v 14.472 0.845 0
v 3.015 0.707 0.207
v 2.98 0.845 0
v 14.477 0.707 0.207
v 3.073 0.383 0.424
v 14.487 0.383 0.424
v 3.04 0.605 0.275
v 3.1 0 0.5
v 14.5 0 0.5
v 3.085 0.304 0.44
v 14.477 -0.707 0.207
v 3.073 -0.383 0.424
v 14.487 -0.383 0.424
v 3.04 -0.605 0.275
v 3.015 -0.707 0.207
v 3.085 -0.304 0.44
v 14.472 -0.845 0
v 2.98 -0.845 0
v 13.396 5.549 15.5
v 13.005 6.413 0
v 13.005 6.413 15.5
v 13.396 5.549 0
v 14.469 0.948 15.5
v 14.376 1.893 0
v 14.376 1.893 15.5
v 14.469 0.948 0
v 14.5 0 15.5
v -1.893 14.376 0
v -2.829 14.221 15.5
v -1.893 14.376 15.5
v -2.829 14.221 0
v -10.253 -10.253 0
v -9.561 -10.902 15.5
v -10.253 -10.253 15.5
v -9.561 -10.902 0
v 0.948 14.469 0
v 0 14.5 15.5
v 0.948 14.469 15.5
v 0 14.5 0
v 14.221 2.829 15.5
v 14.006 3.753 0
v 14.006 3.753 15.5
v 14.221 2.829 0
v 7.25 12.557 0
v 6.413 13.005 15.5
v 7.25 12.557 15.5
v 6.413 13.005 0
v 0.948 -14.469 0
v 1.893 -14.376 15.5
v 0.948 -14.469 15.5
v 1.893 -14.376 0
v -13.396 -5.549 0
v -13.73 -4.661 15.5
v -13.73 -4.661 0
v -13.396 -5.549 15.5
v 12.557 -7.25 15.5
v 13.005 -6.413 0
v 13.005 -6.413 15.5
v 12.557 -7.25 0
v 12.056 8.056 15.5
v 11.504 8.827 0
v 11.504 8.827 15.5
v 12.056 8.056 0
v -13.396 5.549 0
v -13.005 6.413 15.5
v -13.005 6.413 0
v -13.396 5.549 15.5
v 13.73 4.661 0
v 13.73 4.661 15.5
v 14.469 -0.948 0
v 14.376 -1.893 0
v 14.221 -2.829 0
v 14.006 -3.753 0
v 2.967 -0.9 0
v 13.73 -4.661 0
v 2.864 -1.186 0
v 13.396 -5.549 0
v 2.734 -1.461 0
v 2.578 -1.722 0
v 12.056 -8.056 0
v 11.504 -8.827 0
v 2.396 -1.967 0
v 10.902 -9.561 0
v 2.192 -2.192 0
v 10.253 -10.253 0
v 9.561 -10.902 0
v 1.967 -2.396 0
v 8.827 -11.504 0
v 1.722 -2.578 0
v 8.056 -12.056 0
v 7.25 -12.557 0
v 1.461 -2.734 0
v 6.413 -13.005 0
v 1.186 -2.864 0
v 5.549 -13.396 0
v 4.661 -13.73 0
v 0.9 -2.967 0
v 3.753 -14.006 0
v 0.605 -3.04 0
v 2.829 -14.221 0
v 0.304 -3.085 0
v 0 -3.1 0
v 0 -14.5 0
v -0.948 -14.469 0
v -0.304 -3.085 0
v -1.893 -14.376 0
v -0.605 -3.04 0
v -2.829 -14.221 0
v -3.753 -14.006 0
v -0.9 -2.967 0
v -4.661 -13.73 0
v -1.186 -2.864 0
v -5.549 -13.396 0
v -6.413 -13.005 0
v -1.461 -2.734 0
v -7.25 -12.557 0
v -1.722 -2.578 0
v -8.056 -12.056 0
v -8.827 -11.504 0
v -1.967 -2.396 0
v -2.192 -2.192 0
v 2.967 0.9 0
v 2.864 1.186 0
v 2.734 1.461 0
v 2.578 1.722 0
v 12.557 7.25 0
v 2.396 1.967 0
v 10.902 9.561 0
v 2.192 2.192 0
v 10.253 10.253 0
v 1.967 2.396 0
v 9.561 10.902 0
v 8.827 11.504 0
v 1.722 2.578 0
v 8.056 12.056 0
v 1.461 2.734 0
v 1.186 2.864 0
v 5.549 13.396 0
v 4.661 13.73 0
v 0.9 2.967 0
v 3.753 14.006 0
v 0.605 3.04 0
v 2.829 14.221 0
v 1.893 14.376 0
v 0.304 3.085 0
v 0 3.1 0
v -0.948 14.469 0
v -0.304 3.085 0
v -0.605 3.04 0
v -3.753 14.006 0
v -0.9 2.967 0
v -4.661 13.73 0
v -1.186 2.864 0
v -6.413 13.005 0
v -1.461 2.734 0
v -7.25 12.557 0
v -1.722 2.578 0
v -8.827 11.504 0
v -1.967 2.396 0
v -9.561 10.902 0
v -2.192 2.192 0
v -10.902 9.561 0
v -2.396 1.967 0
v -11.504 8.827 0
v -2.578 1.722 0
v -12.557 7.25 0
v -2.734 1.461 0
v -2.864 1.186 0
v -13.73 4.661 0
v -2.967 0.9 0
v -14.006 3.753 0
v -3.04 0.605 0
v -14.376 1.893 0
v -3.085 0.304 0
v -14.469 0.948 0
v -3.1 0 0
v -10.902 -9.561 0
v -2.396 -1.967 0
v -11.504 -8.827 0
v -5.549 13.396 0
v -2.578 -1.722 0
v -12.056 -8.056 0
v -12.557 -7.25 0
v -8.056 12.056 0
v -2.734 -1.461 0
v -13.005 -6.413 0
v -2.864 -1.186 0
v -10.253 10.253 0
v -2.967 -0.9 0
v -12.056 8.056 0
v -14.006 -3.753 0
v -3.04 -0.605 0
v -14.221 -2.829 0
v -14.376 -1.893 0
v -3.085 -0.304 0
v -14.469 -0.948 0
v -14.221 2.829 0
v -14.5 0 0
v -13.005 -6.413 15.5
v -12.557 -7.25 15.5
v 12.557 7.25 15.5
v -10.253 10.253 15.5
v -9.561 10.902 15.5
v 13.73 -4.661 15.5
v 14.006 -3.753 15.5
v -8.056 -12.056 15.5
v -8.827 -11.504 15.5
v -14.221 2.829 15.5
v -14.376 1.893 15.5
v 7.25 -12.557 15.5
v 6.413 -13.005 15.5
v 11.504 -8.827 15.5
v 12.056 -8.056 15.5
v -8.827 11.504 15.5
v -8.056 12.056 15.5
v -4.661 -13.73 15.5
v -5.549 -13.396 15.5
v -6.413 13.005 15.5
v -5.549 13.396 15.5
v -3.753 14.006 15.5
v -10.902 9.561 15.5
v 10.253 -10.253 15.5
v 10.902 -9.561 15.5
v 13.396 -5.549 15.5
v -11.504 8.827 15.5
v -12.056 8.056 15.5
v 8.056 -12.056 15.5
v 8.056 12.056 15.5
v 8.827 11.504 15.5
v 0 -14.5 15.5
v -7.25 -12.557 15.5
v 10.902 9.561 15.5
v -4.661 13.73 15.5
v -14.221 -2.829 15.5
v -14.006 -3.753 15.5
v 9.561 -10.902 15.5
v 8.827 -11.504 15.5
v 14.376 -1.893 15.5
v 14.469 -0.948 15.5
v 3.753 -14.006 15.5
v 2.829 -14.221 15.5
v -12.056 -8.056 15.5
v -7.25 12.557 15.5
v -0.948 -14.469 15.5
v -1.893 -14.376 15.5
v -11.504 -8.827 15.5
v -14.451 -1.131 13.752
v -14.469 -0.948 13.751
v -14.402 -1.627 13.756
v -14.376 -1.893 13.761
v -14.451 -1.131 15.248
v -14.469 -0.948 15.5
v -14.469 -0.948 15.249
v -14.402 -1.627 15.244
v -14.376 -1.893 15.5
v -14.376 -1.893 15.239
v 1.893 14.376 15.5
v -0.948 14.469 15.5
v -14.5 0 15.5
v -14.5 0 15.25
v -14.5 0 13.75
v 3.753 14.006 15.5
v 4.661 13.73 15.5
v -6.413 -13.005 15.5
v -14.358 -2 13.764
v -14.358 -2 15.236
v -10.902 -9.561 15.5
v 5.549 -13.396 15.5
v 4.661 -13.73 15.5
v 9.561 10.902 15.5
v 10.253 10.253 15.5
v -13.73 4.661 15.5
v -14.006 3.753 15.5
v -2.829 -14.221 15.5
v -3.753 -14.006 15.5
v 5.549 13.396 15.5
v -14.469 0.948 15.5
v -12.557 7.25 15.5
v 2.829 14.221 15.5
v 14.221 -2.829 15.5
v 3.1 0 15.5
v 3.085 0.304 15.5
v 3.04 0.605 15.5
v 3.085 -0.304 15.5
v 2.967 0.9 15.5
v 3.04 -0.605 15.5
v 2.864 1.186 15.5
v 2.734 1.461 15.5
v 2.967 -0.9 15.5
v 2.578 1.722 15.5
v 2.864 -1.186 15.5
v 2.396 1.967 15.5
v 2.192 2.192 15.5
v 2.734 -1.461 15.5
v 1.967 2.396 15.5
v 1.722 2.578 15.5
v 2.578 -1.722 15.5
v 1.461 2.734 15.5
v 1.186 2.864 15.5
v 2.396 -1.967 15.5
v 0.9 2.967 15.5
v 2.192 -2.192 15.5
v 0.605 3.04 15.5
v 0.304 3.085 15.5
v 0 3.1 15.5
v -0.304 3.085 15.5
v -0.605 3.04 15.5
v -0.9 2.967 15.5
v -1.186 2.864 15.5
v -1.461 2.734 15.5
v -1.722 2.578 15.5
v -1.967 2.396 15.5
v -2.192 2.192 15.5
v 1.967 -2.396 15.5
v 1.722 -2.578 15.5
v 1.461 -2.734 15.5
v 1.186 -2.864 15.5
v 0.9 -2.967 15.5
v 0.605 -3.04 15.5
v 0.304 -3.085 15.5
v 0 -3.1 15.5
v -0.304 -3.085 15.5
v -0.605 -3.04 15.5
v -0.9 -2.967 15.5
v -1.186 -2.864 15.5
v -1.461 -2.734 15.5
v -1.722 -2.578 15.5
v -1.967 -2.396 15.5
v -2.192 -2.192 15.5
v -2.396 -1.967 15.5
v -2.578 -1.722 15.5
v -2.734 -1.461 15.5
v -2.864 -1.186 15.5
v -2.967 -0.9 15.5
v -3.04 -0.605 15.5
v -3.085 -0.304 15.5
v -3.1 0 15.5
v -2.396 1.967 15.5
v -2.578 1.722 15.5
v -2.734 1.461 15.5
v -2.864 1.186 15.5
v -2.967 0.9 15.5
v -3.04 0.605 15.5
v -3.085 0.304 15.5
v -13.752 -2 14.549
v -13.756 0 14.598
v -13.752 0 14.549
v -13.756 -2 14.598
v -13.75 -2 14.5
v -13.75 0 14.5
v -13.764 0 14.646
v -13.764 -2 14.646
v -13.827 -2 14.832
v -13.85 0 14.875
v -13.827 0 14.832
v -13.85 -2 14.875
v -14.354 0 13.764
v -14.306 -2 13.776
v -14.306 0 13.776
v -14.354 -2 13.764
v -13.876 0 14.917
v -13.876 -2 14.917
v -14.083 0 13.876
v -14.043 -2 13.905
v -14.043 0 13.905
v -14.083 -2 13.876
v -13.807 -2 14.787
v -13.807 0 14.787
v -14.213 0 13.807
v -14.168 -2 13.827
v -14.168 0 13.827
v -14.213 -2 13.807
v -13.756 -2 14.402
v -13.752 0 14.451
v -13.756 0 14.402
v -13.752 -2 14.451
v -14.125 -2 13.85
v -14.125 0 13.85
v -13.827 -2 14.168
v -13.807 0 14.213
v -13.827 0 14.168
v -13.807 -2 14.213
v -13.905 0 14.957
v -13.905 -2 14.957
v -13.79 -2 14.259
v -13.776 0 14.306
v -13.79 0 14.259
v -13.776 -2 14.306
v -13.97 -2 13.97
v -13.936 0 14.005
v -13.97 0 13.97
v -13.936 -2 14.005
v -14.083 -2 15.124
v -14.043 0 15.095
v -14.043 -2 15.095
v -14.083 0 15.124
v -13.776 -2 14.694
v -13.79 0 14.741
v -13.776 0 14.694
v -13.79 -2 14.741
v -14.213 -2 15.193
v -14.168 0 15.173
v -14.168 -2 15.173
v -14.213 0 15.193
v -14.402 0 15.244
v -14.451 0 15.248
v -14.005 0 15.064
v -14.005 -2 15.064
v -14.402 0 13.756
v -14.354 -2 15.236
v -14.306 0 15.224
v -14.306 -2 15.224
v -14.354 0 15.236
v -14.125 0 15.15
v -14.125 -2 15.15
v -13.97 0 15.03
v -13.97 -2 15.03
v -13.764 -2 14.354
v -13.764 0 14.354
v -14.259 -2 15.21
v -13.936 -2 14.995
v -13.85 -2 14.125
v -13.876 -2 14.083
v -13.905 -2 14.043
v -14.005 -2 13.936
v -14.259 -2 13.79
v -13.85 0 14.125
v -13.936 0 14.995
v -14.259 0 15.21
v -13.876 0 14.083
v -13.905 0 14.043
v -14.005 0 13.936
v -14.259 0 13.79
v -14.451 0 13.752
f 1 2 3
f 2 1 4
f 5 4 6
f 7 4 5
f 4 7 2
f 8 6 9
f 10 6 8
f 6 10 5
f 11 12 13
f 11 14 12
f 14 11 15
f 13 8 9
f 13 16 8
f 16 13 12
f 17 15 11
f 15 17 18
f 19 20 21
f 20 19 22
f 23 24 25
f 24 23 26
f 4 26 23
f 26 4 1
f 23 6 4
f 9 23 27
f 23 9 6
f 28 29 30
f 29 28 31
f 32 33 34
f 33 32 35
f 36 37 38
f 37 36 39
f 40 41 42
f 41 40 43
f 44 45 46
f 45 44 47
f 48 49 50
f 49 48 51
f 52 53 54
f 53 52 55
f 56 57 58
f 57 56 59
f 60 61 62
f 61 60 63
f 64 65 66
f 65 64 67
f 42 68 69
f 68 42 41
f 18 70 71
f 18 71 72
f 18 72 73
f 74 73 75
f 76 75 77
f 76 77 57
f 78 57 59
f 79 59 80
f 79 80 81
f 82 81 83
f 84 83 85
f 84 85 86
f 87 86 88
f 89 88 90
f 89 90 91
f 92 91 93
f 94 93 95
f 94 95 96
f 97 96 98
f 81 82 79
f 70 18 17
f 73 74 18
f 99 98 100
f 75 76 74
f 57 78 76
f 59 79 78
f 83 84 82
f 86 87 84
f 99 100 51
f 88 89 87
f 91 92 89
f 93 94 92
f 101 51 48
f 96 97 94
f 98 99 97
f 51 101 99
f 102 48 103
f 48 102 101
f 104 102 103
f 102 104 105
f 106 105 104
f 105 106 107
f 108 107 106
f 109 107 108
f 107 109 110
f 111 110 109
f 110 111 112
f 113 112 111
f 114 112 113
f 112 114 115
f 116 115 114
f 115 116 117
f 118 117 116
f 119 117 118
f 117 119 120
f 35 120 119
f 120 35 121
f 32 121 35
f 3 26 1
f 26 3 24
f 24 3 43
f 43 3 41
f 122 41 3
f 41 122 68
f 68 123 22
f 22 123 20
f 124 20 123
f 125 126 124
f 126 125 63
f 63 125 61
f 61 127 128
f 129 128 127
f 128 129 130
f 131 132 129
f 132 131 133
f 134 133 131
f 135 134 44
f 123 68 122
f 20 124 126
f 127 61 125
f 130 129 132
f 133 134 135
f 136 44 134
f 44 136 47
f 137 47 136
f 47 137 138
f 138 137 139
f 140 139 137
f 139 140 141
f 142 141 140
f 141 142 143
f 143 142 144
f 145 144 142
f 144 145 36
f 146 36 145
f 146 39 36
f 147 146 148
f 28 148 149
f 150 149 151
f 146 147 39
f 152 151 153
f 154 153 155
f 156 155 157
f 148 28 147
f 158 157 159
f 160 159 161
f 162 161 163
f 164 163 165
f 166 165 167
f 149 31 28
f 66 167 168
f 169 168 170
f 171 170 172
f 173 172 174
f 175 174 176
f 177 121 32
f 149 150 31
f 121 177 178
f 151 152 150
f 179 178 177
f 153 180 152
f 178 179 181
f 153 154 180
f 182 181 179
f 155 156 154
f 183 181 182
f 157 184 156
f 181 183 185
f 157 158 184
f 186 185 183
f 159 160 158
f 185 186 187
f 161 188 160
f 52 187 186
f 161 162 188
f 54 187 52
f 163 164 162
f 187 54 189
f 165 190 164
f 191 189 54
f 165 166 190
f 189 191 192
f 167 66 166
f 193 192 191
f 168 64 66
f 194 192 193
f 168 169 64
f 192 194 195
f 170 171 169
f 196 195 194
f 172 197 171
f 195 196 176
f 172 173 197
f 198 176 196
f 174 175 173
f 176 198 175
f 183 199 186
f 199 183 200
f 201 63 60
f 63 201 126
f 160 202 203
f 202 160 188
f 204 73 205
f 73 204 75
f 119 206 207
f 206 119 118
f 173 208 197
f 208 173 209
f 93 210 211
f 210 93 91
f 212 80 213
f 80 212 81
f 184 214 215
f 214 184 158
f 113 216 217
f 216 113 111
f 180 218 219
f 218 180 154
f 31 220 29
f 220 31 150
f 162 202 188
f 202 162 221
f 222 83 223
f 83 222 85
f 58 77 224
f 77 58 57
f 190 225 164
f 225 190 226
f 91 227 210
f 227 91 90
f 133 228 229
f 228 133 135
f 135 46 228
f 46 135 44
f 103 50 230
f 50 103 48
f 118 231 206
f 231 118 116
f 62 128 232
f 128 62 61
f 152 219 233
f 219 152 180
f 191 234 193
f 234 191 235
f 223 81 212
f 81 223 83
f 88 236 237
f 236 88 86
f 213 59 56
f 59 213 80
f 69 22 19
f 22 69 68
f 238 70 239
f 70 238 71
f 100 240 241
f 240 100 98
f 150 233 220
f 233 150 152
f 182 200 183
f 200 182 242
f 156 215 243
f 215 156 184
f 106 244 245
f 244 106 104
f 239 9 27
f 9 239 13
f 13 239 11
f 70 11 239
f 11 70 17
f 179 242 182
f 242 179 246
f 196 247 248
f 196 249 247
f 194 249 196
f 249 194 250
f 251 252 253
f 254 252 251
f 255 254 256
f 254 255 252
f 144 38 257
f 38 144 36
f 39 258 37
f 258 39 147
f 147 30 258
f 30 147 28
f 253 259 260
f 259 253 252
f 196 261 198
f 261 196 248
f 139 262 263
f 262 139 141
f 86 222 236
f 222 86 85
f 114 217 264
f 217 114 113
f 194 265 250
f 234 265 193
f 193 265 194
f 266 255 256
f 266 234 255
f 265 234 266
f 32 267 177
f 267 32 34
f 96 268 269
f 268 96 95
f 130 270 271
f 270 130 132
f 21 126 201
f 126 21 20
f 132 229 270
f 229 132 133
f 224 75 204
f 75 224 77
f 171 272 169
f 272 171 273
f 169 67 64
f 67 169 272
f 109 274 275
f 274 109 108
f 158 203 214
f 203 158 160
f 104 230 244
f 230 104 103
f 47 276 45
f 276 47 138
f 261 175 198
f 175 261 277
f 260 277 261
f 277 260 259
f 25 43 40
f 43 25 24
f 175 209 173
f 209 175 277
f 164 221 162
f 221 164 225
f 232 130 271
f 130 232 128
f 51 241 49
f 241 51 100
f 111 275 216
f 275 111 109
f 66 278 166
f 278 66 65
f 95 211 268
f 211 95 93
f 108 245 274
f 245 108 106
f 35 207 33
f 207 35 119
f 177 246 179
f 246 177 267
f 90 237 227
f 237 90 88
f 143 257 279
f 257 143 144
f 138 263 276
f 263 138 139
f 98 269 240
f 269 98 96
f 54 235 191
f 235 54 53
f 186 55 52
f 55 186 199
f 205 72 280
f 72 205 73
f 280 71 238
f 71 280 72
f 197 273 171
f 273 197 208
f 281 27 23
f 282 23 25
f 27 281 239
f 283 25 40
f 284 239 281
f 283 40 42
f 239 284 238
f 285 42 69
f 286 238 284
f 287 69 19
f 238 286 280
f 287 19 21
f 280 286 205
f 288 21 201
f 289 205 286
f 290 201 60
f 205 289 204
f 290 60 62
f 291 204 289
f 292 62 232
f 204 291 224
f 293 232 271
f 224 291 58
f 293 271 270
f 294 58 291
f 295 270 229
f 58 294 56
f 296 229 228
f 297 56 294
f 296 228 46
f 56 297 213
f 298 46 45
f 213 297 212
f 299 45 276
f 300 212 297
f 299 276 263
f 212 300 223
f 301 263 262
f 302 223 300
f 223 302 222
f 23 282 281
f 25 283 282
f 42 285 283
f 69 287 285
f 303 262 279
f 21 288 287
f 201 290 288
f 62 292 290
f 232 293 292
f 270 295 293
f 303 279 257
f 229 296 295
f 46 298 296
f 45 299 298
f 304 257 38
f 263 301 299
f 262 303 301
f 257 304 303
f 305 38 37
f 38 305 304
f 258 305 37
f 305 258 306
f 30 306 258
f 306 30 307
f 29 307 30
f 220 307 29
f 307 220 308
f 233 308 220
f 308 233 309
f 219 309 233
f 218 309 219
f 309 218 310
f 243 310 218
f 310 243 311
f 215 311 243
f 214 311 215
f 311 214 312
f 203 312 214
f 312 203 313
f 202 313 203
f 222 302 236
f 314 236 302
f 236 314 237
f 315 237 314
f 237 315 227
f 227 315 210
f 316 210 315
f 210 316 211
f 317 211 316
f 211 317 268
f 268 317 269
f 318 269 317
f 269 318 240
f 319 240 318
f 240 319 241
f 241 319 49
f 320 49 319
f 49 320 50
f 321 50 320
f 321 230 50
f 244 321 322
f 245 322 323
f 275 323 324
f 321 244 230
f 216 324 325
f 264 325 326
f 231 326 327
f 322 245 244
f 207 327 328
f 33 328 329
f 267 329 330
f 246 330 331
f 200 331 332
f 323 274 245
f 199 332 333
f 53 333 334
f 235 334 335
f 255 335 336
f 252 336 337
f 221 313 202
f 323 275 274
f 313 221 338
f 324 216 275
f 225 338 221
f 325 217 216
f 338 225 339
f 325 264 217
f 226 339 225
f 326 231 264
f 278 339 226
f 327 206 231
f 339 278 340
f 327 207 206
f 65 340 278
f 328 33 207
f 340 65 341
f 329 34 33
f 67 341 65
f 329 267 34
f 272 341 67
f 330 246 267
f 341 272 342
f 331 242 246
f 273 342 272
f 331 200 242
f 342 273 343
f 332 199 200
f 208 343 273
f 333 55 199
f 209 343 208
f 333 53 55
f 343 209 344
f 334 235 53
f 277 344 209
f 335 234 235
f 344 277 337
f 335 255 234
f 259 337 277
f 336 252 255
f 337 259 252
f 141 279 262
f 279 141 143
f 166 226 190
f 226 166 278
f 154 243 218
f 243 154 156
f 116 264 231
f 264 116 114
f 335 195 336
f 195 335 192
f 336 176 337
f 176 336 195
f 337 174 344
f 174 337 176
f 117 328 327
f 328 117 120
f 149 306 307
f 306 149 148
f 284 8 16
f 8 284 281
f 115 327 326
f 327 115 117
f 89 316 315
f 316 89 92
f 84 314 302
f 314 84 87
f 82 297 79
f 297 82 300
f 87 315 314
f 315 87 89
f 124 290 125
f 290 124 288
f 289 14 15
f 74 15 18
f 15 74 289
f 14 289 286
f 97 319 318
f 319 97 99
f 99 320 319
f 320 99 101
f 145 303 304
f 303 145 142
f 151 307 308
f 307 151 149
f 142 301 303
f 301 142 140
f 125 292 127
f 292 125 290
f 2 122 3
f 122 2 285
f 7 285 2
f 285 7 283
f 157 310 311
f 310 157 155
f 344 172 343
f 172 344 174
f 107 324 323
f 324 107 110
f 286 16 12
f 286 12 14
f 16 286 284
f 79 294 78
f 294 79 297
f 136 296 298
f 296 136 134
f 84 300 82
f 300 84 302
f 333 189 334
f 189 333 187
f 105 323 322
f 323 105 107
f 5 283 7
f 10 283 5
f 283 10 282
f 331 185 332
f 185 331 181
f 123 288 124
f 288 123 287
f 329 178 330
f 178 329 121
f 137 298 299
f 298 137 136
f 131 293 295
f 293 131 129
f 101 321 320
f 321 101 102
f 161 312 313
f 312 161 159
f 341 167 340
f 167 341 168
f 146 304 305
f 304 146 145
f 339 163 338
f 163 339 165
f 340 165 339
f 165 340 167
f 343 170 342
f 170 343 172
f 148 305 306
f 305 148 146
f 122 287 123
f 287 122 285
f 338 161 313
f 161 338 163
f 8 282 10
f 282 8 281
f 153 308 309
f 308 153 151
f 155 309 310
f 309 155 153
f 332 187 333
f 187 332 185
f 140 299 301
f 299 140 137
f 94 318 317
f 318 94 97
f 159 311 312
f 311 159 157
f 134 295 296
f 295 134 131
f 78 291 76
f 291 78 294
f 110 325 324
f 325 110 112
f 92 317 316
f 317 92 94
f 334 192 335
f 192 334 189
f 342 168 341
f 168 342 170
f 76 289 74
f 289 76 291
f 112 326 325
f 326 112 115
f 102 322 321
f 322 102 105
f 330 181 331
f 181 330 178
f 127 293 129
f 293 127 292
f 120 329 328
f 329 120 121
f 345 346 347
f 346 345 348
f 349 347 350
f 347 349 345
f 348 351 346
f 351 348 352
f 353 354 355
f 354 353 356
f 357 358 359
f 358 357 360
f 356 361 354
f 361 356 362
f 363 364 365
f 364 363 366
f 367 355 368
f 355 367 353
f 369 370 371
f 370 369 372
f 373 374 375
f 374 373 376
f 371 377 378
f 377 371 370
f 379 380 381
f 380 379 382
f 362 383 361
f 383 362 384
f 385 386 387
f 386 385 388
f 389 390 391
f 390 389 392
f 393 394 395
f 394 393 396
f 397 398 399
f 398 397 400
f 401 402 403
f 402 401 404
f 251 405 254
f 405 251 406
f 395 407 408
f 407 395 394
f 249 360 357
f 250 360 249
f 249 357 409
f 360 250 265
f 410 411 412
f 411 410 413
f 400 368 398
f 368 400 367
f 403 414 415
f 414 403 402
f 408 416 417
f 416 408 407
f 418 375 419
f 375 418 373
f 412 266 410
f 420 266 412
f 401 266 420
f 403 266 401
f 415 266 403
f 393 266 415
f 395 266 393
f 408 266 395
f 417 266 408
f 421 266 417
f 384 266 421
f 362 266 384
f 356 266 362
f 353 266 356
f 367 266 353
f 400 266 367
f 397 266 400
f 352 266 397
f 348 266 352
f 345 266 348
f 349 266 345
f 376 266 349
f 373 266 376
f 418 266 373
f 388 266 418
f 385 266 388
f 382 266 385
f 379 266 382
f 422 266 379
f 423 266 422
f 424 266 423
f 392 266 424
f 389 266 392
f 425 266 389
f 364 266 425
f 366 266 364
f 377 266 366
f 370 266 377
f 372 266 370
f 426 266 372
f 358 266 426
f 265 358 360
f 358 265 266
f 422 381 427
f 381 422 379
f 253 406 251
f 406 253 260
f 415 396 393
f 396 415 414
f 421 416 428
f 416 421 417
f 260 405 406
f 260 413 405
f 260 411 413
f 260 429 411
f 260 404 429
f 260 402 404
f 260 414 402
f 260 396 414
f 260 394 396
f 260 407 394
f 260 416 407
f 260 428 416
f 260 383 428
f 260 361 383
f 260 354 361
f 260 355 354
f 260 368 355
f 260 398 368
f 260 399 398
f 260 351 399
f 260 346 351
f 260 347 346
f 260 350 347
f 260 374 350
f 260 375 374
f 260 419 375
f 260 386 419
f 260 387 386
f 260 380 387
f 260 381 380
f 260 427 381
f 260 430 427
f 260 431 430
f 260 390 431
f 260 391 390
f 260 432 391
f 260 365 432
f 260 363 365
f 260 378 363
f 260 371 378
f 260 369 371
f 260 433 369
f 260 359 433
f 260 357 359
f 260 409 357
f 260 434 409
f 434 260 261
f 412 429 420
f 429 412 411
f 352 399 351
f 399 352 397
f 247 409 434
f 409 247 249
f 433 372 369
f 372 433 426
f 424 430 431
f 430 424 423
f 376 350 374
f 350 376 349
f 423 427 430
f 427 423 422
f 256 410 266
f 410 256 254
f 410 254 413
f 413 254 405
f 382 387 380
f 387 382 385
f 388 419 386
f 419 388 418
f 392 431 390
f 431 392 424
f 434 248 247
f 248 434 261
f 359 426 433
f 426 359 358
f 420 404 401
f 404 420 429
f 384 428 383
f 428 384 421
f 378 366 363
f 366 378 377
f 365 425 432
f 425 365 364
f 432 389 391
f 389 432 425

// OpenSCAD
// Replacement knob for hotplate stirrer (D-shaft 6 mm)
// Print orientation: bottom face (with D-bore) on the bed, z = 0

// ---------------- Parameters ----------------
knob_d        = 30;    // knob outer diameter
knob_h        = 15;    // knob height
shaft_d       = 6.2;   // D-bore diameter
shaft_flat    = 4.7;   // distance from D-flat to opposite side
groove_count  = 18;    // number of vertical grip grooves
groove_d      = 2;     // groove diameter (half-cylinder)
pointer_w     = 1.5;   // pointer groove width
pointer_d     = 1;     // pointer groove depth
eps           = 0.5;   // overcut for clean differences

$fn = 96;

// ---------------- Derived ----------------
D = knob_d - 2 * eps;              // outer cylinder diameter (thickened walls)
H = knob_h + eps;                  // full height for groove overcut
r = shaft_d / 2;                   // bore radius
R = knob_d / 2;                    // outer radius
pitch = R / groove_count;          // groove centre spacing along the rim

// ---------------- Model ----------------
difference() {
    // Main body
    cylinder(d = D, h = H);

    // D-shaped blind bore from bottom face
    translate([0, 0, -eps])
        linear_extrude(height = H + 2 * eps)
            hull() {
                for (a = [0, 180])
                    rotate([0, 0, a])
                        circle(r = r, $fn = 64);
            }

    // Pointer groove, centred on -x axis (same side as flat)
    translate([-R + eps, 0, H - pointer_d])
        rotate([90, 0, 0])
            cylinder(d = pointer_w, h = pointer_d + 2 * eps);

    // Vertical grip grooves along full height
    for (i = [0 : groove_count - 1])
        translate([pitch * i, 0, -eps])
            rotate([0, 90, 0])
                cylinder(d = groove_d, h = H + 2 * eps, $fn = 16);
}
